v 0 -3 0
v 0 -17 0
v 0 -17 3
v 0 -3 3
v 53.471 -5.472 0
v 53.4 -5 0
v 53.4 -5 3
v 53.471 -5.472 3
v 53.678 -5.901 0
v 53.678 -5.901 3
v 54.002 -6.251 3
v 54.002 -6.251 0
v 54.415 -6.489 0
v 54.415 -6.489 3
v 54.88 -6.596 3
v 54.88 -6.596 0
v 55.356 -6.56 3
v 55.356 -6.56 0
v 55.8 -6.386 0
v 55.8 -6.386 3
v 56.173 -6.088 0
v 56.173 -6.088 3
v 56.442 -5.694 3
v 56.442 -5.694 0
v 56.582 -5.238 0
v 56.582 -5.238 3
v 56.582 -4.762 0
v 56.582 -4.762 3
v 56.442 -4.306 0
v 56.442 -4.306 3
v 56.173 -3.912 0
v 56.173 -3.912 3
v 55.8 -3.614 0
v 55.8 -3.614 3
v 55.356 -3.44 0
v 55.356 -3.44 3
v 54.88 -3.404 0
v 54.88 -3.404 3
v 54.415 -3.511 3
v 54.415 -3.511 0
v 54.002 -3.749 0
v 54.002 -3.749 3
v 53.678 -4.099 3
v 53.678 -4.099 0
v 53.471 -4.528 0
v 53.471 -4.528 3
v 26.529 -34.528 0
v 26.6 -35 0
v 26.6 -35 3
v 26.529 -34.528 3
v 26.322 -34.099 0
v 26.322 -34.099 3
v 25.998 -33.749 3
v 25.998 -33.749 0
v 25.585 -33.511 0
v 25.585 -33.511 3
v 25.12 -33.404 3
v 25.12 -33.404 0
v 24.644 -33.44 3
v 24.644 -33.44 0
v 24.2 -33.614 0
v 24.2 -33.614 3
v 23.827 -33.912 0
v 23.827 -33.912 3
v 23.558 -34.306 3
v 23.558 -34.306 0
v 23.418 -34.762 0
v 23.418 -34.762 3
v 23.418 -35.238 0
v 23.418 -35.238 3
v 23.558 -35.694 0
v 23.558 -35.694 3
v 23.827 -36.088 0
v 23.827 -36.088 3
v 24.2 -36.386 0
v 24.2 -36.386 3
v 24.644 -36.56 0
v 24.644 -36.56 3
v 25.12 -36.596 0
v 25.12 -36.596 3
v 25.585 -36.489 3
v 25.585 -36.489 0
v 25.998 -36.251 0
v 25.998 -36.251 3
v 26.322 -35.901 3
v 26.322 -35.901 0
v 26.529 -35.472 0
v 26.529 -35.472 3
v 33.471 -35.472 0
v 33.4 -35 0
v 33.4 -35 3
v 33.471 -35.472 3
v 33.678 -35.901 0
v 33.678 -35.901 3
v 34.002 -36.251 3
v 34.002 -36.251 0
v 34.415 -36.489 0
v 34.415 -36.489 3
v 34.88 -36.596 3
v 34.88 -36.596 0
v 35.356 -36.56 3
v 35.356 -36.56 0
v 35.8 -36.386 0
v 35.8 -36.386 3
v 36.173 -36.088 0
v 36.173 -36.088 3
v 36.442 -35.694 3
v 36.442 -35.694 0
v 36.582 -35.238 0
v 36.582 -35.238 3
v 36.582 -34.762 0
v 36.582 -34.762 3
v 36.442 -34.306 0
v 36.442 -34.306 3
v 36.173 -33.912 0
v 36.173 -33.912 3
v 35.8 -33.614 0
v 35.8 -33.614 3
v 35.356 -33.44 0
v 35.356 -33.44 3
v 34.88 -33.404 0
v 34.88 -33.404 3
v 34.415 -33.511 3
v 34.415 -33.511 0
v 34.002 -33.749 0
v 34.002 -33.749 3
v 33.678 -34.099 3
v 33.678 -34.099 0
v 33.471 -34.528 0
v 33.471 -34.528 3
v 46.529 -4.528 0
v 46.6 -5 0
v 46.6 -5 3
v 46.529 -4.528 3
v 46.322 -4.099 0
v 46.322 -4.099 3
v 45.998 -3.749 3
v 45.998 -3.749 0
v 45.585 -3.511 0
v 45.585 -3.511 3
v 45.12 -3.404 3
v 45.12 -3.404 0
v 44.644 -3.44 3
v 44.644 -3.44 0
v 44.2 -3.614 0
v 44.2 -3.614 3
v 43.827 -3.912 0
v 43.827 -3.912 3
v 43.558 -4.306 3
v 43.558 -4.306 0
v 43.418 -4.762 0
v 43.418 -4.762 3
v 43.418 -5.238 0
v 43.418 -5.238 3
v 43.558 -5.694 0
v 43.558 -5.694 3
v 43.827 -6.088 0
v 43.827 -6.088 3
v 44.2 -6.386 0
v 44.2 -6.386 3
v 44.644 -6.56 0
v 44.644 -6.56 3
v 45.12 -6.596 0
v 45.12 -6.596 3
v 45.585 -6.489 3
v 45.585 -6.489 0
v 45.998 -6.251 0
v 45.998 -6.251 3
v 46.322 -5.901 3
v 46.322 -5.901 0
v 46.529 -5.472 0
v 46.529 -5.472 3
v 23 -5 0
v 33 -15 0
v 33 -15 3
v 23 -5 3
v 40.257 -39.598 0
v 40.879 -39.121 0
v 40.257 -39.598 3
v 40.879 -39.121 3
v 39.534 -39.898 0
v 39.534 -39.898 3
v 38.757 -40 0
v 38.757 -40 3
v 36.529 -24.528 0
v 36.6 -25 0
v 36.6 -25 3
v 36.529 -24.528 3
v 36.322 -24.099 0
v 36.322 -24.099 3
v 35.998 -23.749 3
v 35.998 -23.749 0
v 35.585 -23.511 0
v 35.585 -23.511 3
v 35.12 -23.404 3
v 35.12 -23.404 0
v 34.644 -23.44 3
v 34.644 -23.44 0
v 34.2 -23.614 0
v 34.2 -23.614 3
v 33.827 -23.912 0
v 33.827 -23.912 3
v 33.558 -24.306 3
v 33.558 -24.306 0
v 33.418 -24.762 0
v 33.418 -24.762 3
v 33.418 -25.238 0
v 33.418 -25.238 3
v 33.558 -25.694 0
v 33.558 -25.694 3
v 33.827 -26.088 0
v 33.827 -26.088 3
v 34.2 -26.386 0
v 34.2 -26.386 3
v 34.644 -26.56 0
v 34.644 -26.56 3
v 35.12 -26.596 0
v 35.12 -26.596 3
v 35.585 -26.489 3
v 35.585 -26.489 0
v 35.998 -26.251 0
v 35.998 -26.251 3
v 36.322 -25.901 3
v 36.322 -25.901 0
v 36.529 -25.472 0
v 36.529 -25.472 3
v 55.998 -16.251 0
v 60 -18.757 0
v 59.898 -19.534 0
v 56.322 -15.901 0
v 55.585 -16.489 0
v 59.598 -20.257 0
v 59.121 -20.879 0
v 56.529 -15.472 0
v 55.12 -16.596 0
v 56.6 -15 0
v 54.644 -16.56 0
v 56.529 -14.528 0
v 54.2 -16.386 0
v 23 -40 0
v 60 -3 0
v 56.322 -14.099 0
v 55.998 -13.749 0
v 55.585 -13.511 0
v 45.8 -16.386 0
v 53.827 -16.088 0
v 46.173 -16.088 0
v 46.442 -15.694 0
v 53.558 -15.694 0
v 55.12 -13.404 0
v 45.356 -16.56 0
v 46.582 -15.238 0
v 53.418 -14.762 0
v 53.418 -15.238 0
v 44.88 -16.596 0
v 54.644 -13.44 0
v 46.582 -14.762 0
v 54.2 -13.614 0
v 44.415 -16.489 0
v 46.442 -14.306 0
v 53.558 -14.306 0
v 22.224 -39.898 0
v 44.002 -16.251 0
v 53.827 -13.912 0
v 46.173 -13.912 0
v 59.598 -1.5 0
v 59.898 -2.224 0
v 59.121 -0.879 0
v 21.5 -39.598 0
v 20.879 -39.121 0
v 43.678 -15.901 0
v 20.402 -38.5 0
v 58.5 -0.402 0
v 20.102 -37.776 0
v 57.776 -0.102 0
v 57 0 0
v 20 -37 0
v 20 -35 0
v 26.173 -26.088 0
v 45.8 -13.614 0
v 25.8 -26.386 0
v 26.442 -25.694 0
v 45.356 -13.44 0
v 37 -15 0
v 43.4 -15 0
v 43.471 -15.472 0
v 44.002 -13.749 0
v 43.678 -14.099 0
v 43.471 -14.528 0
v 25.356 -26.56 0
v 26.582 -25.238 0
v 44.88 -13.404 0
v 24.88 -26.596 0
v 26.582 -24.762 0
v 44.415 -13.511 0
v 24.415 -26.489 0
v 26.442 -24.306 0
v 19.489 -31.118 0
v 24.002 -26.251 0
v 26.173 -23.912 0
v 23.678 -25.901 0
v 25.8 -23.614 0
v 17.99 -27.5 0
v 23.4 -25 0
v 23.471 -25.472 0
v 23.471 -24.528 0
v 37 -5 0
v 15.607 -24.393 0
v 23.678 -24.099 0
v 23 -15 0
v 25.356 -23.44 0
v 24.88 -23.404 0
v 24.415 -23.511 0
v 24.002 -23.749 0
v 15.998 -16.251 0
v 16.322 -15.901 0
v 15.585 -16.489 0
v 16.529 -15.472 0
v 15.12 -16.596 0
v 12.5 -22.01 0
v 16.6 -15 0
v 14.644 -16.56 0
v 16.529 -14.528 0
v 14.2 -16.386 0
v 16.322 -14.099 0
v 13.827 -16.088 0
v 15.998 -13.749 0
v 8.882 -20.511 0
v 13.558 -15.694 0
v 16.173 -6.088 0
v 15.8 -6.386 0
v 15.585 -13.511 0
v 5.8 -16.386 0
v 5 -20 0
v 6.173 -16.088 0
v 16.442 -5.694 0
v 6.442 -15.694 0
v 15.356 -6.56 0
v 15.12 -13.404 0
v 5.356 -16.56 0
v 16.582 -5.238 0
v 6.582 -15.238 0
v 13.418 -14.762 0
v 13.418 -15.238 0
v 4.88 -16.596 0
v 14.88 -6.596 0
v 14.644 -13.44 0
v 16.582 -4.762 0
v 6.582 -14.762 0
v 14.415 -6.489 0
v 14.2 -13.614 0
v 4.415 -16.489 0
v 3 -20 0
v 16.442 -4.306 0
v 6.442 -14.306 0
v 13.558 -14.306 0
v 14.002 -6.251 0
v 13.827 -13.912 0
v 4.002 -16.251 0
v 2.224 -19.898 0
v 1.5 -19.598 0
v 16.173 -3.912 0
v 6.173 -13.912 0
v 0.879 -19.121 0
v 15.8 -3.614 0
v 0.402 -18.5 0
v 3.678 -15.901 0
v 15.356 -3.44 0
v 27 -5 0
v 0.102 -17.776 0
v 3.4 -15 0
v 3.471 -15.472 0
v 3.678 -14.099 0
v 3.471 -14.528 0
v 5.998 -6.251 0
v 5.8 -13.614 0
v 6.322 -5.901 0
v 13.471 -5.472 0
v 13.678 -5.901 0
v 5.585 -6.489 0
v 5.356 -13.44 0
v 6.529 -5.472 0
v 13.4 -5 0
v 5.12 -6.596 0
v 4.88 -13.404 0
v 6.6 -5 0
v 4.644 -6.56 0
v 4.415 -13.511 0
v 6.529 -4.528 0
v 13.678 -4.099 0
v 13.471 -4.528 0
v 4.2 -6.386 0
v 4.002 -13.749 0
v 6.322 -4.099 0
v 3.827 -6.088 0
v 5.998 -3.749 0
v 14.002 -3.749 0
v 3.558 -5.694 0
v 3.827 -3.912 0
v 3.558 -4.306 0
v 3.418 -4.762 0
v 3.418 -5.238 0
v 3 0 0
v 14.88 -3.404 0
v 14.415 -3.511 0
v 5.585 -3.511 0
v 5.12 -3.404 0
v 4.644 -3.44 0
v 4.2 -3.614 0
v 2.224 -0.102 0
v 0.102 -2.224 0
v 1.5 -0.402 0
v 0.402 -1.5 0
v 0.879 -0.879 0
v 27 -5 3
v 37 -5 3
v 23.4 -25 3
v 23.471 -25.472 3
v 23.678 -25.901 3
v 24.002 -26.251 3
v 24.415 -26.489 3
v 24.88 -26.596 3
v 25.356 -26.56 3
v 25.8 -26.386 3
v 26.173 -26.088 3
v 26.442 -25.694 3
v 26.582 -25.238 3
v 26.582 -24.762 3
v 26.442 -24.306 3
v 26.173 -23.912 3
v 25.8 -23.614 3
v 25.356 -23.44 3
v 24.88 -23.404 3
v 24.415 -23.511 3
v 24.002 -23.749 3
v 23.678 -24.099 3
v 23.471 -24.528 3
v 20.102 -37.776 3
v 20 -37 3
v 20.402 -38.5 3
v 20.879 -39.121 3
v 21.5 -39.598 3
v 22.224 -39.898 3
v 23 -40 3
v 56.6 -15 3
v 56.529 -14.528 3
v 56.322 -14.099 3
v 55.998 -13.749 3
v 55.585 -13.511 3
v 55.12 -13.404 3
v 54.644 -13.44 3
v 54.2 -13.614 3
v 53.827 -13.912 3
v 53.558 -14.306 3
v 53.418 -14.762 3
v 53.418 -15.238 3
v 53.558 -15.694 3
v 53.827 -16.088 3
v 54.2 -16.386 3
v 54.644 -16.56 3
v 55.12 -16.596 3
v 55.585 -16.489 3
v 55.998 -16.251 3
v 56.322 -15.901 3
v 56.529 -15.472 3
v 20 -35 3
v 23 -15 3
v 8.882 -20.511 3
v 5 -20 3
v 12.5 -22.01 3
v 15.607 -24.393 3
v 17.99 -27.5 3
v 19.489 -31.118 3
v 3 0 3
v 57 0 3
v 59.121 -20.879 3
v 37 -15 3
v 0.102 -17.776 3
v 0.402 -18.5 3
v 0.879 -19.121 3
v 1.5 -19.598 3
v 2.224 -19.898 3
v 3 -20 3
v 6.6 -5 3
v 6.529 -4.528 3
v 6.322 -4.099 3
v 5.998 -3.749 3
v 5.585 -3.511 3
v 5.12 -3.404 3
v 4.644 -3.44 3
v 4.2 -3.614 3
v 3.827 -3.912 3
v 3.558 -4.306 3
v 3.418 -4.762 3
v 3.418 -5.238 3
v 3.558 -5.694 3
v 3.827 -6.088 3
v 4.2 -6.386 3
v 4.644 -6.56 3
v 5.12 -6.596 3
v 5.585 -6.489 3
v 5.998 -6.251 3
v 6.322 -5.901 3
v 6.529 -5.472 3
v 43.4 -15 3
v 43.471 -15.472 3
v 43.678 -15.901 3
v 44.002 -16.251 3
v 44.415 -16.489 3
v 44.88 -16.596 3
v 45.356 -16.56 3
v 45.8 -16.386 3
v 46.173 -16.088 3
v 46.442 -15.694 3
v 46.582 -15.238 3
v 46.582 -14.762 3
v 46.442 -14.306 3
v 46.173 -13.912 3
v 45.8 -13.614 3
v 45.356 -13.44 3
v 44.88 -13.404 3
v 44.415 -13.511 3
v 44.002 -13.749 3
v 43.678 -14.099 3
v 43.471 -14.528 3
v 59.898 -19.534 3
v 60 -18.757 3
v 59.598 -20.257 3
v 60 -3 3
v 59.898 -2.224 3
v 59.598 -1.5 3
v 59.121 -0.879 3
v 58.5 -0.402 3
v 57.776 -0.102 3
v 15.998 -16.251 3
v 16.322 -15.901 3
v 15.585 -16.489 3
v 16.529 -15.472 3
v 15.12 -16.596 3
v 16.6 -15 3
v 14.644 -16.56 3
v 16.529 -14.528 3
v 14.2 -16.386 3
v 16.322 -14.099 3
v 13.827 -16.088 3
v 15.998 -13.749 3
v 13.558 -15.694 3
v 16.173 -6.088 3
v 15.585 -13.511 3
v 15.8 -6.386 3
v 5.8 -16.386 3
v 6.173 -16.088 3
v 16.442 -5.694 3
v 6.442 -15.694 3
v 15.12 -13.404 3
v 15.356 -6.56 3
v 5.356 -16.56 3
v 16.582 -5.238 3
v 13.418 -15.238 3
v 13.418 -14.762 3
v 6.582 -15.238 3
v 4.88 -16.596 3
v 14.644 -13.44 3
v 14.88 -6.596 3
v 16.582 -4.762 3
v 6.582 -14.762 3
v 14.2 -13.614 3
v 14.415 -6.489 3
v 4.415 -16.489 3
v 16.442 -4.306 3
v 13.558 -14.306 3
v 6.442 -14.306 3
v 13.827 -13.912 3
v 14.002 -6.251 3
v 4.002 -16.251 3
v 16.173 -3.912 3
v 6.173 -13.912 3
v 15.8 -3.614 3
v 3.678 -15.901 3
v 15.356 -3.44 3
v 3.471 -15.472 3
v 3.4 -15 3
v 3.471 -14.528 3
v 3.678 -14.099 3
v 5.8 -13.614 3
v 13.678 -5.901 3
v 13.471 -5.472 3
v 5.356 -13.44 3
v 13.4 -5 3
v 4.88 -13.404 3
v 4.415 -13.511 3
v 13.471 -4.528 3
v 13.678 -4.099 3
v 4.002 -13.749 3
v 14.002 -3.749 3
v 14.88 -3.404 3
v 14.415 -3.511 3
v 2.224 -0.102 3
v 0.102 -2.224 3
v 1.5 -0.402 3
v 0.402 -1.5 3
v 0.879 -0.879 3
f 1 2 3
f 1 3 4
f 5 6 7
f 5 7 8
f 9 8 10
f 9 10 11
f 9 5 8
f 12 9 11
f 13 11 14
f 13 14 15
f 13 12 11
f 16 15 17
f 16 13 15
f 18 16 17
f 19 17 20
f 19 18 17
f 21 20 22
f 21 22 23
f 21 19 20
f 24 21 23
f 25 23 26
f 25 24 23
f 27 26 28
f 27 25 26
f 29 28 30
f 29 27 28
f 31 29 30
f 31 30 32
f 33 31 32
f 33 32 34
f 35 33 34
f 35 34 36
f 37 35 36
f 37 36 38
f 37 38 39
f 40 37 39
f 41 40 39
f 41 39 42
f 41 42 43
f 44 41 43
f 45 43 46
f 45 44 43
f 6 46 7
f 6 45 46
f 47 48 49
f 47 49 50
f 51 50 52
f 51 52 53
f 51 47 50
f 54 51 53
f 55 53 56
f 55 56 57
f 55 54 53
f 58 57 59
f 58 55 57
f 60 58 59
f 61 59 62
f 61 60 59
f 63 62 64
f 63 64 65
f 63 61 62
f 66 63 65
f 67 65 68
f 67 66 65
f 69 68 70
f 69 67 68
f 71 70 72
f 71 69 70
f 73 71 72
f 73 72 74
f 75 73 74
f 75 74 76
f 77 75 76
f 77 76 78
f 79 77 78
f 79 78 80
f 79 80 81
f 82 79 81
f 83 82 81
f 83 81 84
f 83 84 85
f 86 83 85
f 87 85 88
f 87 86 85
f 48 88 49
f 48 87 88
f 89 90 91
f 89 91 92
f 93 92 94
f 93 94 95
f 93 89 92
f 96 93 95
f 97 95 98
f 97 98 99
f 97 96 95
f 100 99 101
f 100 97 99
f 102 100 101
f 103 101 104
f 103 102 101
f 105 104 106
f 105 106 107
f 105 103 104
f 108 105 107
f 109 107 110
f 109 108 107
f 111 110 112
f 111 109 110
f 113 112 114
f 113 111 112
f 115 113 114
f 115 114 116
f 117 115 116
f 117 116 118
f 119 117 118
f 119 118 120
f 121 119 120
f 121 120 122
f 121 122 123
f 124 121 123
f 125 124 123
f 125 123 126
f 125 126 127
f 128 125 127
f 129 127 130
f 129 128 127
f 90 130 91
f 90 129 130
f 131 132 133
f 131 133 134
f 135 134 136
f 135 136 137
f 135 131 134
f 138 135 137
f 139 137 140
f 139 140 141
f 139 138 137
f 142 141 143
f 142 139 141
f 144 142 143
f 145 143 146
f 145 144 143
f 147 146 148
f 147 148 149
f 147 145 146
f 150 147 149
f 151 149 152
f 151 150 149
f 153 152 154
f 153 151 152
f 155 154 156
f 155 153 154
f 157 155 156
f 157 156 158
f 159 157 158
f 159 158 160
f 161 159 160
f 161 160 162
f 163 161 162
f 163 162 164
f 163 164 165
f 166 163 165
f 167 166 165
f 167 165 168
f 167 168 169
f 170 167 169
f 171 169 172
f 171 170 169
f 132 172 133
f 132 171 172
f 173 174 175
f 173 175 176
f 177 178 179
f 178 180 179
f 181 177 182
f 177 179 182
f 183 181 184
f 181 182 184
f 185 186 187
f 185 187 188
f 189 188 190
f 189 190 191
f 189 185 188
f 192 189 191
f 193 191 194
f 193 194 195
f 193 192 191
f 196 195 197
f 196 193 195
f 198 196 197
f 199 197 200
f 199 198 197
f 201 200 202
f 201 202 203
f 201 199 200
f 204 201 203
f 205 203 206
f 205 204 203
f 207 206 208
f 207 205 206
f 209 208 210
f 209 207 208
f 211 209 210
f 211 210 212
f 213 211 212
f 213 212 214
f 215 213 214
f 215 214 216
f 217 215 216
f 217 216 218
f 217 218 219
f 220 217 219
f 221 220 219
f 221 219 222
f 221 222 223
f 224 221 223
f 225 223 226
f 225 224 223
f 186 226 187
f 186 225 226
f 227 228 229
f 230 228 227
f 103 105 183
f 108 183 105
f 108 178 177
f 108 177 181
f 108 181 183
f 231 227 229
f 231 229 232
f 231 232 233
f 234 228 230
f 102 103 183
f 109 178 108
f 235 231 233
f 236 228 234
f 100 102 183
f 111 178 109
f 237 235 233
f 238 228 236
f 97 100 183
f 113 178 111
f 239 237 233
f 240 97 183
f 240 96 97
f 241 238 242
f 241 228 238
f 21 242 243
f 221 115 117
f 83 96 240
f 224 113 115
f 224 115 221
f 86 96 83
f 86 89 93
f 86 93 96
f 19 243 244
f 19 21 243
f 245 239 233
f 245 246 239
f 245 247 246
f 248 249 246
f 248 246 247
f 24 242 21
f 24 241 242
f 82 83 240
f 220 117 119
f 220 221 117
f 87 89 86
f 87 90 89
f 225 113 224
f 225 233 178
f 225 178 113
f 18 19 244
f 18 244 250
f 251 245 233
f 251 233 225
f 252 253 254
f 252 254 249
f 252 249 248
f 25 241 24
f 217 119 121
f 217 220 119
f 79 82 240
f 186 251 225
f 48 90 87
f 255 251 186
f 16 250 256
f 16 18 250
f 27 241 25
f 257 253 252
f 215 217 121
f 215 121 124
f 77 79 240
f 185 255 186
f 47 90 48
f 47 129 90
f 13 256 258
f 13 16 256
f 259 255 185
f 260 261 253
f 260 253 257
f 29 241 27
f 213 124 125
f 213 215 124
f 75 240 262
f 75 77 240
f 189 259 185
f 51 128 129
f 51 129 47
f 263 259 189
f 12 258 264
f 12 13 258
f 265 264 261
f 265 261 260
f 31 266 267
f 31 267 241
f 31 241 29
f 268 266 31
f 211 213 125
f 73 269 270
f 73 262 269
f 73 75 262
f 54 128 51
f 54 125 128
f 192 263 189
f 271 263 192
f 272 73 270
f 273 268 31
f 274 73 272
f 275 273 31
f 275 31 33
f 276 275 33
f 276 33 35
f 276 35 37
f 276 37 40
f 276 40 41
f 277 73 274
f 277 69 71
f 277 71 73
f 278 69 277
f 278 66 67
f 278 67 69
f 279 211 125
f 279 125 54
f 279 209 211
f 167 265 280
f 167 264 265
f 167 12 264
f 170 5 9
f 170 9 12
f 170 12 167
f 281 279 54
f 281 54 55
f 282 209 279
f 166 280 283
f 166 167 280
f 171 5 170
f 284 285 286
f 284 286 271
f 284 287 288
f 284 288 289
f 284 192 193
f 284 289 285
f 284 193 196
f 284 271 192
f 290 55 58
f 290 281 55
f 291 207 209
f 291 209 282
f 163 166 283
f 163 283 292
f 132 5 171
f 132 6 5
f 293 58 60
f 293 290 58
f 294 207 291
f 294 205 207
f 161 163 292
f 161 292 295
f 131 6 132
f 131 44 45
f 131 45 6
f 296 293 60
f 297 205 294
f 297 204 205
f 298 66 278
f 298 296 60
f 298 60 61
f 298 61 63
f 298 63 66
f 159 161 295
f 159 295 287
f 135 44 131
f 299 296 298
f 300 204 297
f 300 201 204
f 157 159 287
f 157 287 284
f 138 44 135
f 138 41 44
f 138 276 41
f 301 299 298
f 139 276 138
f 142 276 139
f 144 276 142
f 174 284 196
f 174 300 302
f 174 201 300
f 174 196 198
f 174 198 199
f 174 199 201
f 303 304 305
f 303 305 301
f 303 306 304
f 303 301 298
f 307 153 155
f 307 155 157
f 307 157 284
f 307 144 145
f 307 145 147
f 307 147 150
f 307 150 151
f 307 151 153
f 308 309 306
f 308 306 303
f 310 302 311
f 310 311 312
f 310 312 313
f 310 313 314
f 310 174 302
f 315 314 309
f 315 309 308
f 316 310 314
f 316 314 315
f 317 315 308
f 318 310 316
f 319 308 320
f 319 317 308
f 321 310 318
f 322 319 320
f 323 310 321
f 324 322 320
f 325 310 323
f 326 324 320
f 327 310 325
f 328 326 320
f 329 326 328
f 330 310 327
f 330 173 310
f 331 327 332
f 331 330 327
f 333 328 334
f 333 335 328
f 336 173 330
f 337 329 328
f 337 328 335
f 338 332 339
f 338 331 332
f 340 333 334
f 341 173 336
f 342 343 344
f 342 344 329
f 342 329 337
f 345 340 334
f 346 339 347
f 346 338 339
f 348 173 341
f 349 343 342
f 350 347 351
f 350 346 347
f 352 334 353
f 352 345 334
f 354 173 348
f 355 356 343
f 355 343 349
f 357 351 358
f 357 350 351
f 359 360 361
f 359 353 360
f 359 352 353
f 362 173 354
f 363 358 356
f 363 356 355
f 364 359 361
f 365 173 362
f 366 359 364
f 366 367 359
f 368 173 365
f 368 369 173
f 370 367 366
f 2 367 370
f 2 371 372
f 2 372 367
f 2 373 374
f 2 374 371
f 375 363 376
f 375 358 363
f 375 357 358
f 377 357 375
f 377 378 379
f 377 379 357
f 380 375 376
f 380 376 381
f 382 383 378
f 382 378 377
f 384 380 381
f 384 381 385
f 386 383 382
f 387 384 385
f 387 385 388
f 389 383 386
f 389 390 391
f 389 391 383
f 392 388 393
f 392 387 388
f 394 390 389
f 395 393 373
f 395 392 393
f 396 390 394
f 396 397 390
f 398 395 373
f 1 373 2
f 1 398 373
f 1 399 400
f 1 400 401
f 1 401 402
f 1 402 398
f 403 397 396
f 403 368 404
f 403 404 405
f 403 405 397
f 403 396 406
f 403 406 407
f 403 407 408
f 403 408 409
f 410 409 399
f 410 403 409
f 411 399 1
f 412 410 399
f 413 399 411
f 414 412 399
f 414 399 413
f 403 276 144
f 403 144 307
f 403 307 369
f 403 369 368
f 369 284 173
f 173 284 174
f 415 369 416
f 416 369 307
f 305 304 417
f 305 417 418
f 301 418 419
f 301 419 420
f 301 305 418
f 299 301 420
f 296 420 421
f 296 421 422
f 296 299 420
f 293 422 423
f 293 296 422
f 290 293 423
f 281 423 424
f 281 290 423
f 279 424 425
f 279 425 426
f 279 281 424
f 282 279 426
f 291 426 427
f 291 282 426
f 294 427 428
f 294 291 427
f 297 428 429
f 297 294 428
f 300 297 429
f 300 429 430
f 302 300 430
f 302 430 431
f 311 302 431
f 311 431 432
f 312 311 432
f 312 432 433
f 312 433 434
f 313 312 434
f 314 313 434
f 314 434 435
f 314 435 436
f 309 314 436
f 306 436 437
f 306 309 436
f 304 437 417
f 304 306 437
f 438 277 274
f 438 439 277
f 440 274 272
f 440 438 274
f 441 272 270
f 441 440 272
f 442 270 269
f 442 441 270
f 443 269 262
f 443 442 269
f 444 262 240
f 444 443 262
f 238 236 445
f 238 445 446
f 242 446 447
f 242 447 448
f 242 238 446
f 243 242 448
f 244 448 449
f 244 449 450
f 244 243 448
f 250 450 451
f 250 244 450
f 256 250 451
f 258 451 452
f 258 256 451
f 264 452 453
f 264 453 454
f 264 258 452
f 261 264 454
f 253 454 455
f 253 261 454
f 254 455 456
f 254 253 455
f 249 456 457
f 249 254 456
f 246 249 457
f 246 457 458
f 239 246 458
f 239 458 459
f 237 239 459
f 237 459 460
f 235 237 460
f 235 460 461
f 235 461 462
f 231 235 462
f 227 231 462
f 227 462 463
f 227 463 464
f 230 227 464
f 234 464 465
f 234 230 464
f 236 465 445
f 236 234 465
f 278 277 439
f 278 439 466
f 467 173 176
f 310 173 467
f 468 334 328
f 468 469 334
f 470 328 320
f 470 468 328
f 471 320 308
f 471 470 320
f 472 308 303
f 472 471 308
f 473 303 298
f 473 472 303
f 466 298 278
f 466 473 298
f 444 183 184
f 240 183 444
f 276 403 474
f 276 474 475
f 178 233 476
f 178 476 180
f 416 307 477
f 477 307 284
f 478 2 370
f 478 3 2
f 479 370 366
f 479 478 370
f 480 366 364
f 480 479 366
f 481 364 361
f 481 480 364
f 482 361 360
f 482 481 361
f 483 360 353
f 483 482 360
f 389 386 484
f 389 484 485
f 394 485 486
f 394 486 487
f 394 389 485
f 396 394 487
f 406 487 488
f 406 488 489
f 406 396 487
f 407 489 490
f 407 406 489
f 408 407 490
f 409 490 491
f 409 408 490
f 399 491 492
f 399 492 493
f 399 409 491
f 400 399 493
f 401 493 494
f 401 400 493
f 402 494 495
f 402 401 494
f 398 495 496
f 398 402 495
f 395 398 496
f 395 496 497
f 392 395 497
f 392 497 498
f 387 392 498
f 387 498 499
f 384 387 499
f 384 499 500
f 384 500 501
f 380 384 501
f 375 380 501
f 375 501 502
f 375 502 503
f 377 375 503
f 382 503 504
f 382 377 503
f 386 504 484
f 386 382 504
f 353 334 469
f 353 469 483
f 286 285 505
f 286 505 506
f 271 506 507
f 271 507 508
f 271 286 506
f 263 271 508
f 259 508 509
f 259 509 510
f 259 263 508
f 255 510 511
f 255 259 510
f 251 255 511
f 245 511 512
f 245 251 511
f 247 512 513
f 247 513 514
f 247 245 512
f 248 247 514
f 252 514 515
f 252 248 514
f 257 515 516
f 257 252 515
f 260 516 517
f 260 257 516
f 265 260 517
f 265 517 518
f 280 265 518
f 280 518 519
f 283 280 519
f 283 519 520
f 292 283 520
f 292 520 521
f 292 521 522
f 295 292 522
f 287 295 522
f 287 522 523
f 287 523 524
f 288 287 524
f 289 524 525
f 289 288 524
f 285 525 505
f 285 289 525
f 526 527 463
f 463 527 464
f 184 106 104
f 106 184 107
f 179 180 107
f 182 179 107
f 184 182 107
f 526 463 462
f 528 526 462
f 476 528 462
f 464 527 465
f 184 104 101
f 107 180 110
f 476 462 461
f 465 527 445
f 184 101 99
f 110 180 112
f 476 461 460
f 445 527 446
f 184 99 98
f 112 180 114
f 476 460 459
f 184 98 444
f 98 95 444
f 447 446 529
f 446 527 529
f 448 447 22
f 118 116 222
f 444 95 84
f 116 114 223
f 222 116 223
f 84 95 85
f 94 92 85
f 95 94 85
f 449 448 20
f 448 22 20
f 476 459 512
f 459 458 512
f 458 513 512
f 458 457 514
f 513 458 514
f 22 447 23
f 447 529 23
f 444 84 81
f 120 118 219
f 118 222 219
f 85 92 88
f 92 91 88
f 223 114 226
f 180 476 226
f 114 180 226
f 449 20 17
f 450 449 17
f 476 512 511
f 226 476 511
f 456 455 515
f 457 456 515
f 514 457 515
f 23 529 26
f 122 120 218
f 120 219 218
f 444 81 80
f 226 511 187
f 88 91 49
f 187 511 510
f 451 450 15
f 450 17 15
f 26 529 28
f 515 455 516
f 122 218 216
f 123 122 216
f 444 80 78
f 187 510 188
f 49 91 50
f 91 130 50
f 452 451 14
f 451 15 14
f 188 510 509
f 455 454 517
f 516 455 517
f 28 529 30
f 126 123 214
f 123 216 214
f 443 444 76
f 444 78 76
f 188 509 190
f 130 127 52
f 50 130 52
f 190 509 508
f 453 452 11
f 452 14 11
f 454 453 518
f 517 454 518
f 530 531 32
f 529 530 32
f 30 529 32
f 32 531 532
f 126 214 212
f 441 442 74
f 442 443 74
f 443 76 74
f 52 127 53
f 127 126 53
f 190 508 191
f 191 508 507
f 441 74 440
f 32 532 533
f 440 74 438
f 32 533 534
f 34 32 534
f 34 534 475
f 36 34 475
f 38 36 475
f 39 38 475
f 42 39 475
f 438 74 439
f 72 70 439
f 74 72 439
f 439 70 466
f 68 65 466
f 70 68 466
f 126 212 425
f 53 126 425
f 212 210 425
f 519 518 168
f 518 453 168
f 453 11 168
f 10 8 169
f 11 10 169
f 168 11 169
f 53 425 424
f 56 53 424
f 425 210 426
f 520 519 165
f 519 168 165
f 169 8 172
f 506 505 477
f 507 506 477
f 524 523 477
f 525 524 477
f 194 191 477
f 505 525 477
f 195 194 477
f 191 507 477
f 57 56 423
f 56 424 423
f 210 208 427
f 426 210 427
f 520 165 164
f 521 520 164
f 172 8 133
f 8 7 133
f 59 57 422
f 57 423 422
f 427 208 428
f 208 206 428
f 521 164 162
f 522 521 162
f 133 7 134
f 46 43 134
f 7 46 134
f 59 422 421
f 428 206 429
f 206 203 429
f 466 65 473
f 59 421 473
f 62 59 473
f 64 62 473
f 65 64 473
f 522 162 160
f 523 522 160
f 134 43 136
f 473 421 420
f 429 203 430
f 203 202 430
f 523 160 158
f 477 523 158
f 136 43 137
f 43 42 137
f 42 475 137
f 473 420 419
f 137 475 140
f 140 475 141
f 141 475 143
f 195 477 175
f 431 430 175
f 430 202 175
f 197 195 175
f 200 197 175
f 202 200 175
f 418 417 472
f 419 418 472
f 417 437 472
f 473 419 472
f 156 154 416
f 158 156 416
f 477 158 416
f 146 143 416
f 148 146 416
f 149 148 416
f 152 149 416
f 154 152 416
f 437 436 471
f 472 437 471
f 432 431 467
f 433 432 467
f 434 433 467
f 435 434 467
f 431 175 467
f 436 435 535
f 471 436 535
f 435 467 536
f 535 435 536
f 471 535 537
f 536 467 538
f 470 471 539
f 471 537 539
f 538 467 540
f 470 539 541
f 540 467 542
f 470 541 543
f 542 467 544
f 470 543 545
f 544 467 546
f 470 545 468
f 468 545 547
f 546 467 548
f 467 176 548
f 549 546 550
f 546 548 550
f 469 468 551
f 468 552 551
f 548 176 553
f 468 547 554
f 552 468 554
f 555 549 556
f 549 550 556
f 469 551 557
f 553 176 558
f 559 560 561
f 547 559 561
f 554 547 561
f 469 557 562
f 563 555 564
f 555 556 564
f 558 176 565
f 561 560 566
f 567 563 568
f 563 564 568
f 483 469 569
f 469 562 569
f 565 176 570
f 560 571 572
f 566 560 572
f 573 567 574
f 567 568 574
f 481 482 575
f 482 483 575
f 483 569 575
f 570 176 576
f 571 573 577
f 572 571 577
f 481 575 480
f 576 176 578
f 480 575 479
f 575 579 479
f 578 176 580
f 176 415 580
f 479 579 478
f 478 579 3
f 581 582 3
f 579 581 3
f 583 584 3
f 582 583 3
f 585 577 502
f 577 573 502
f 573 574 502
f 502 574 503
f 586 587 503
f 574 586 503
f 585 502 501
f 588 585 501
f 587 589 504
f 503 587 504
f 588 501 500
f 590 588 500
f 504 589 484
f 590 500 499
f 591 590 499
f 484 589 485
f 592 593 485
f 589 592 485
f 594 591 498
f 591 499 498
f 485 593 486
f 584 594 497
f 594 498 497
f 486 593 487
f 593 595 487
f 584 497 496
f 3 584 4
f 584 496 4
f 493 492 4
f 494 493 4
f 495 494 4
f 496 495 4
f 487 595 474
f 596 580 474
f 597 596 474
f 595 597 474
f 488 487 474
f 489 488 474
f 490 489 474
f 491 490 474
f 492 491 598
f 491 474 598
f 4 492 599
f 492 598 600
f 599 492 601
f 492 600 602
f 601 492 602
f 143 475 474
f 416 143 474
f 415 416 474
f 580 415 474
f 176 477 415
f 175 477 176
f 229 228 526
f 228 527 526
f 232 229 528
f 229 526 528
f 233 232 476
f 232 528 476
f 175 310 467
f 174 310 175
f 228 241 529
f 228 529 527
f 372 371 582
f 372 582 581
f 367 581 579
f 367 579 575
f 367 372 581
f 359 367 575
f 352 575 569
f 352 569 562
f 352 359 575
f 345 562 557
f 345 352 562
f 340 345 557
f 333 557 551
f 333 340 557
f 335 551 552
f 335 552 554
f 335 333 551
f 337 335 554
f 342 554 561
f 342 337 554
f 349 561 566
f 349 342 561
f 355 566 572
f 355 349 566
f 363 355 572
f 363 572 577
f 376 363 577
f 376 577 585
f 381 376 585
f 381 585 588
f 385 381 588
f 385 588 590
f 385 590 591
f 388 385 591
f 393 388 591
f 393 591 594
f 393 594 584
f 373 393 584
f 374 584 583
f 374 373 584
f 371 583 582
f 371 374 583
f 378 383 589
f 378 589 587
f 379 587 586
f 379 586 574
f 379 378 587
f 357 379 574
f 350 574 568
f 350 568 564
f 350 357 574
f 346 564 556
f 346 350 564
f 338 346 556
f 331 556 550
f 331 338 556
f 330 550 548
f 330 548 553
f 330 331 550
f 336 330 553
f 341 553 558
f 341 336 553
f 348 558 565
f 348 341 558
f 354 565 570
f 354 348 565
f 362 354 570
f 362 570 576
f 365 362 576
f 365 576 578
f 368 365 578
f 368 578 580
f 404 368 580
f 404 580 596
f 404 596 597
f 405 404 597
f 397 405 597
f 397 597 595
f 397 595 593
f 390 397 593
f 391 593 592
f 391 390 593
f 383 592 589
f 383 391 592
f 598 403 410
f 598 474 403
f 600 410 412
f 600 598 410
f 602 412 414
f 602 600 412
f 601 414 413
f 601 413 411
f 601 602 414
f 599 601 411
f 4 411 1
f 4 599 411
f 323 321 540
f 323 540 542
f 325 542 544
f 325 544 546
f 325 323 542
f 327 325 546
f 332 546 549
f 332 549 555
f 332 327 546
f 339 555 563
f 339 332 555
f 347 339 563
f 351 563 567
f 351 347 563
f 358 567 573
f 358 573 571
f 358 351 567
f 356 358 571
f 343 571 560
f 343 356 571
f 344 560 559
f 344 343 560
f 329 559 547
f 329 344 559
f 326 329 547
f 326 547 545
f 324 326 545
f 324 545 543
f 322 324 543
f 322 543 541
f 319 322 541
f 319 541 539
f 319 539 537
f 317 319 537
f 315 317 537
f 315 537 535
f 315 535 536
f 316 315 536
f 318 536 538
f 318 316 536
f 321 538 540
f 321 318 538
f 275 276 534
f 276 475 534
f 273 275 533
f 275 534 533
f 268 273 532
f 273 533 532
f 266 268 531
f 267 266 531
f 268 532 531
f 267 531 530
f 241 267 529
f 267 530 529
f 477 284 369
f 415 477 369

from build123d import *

# Parameters (mm, degrees)
SKETCH_1_R      = 1.6
EXTRUDE_1_DEPTH = 3
FILLET_1_R      = 3
FILLET_2_R      = 15


with BuildPart() as part:
    # 草图1 → 凸台-拉伸1 (new body)
    with BuildSketch(Plane.XY):
        Polygon((0, 0), (60, 0), (60, -20), (40, -40), (20, -40), (20, -20), (0, -20), align=None)
        with Locations((5, -5)):
            Circle(SKETCH_1_R, mode=Mode.SUBTRACT)
        with Locations(Location((15, -5, 0), (0, 0, 180))):
            Circle(SKETCH_1_R, mode=Mode.SUBTRACT)
        with Locations((15, -15)):
            Circle(SKETCH_1_R, mode=Mode.SUBTRACT)
        with Locations(Location((5, -15, 0), (0, 0, 180))):
            Circle(SKETCH_1_R, mode=Mode.SUBTRACT)
        with Locations((55, -15)):
            Circle(SKETCH_1_R, mode=Mode.SUBTRACT)
        with Locations(Location((45, -15, 0), (0, 0, 180))):
            Circle(SKETCH_1_R, mode=Mode.SUBTRACT)
        with Locations((45, -5)):
            Circle(SKETCH_1_R, mode=Mode.SUBTRACT)
        with Locations(Location((55, -5, 0), (0, 0, 180))):
            Circle(SKETCH_1_R, mode=Mode.SUBTRACT)
        with Locations((25, -35)):
            Circle(SKETCH_1_R, mode=Mode.SUBTRACT)
        with Locations(Location((35, -35, 0), (0, 0, 180))):
            Circle(SKETCH_1_R, mode=Mode.SUBTRACT)
        with Locations((35, -25)):
            Circle(SKETCH_1_R, mode=Mode.SUBTRACT)
        with Locations(Location((25, -25, 0), (0, 0, 180))):
            Circle(SKETCH_1_R, mode=Mode.SUBTRACT)
        Polygon((23, -5), (23, -15), (33, -15), align=None, mode=Mode.SUBTRACT)
        Polygon((27, -5), (37, -5), (37, -15), align=None, mode=Mode.SUBTRACT)
    extrude(amount=EXTRUDE_1_DEPTH)

    # 圆角1
    fillet_1_edges = [part.edges().sort_by_distance(p)[0] for p in [
        (0, 0, 1.5),
        (60, 0, 1.5),
        (60, -20, 1.5),
        (40, -40, 1.5),
        (20, -40, 1.5),
        (0, -20, 1.5),
    ]]
    fillet(fillet_1_edges, radius=FILLET_1_R)

    # 圆角2
    fillet_2_edges = [part.edges().sort_by_distance(p)[0] for p in [
        (20, -20, 1.5),
    ]]
    fillet(fillet_2_edges, radius=FILLET_2_R)


solid = part.part
